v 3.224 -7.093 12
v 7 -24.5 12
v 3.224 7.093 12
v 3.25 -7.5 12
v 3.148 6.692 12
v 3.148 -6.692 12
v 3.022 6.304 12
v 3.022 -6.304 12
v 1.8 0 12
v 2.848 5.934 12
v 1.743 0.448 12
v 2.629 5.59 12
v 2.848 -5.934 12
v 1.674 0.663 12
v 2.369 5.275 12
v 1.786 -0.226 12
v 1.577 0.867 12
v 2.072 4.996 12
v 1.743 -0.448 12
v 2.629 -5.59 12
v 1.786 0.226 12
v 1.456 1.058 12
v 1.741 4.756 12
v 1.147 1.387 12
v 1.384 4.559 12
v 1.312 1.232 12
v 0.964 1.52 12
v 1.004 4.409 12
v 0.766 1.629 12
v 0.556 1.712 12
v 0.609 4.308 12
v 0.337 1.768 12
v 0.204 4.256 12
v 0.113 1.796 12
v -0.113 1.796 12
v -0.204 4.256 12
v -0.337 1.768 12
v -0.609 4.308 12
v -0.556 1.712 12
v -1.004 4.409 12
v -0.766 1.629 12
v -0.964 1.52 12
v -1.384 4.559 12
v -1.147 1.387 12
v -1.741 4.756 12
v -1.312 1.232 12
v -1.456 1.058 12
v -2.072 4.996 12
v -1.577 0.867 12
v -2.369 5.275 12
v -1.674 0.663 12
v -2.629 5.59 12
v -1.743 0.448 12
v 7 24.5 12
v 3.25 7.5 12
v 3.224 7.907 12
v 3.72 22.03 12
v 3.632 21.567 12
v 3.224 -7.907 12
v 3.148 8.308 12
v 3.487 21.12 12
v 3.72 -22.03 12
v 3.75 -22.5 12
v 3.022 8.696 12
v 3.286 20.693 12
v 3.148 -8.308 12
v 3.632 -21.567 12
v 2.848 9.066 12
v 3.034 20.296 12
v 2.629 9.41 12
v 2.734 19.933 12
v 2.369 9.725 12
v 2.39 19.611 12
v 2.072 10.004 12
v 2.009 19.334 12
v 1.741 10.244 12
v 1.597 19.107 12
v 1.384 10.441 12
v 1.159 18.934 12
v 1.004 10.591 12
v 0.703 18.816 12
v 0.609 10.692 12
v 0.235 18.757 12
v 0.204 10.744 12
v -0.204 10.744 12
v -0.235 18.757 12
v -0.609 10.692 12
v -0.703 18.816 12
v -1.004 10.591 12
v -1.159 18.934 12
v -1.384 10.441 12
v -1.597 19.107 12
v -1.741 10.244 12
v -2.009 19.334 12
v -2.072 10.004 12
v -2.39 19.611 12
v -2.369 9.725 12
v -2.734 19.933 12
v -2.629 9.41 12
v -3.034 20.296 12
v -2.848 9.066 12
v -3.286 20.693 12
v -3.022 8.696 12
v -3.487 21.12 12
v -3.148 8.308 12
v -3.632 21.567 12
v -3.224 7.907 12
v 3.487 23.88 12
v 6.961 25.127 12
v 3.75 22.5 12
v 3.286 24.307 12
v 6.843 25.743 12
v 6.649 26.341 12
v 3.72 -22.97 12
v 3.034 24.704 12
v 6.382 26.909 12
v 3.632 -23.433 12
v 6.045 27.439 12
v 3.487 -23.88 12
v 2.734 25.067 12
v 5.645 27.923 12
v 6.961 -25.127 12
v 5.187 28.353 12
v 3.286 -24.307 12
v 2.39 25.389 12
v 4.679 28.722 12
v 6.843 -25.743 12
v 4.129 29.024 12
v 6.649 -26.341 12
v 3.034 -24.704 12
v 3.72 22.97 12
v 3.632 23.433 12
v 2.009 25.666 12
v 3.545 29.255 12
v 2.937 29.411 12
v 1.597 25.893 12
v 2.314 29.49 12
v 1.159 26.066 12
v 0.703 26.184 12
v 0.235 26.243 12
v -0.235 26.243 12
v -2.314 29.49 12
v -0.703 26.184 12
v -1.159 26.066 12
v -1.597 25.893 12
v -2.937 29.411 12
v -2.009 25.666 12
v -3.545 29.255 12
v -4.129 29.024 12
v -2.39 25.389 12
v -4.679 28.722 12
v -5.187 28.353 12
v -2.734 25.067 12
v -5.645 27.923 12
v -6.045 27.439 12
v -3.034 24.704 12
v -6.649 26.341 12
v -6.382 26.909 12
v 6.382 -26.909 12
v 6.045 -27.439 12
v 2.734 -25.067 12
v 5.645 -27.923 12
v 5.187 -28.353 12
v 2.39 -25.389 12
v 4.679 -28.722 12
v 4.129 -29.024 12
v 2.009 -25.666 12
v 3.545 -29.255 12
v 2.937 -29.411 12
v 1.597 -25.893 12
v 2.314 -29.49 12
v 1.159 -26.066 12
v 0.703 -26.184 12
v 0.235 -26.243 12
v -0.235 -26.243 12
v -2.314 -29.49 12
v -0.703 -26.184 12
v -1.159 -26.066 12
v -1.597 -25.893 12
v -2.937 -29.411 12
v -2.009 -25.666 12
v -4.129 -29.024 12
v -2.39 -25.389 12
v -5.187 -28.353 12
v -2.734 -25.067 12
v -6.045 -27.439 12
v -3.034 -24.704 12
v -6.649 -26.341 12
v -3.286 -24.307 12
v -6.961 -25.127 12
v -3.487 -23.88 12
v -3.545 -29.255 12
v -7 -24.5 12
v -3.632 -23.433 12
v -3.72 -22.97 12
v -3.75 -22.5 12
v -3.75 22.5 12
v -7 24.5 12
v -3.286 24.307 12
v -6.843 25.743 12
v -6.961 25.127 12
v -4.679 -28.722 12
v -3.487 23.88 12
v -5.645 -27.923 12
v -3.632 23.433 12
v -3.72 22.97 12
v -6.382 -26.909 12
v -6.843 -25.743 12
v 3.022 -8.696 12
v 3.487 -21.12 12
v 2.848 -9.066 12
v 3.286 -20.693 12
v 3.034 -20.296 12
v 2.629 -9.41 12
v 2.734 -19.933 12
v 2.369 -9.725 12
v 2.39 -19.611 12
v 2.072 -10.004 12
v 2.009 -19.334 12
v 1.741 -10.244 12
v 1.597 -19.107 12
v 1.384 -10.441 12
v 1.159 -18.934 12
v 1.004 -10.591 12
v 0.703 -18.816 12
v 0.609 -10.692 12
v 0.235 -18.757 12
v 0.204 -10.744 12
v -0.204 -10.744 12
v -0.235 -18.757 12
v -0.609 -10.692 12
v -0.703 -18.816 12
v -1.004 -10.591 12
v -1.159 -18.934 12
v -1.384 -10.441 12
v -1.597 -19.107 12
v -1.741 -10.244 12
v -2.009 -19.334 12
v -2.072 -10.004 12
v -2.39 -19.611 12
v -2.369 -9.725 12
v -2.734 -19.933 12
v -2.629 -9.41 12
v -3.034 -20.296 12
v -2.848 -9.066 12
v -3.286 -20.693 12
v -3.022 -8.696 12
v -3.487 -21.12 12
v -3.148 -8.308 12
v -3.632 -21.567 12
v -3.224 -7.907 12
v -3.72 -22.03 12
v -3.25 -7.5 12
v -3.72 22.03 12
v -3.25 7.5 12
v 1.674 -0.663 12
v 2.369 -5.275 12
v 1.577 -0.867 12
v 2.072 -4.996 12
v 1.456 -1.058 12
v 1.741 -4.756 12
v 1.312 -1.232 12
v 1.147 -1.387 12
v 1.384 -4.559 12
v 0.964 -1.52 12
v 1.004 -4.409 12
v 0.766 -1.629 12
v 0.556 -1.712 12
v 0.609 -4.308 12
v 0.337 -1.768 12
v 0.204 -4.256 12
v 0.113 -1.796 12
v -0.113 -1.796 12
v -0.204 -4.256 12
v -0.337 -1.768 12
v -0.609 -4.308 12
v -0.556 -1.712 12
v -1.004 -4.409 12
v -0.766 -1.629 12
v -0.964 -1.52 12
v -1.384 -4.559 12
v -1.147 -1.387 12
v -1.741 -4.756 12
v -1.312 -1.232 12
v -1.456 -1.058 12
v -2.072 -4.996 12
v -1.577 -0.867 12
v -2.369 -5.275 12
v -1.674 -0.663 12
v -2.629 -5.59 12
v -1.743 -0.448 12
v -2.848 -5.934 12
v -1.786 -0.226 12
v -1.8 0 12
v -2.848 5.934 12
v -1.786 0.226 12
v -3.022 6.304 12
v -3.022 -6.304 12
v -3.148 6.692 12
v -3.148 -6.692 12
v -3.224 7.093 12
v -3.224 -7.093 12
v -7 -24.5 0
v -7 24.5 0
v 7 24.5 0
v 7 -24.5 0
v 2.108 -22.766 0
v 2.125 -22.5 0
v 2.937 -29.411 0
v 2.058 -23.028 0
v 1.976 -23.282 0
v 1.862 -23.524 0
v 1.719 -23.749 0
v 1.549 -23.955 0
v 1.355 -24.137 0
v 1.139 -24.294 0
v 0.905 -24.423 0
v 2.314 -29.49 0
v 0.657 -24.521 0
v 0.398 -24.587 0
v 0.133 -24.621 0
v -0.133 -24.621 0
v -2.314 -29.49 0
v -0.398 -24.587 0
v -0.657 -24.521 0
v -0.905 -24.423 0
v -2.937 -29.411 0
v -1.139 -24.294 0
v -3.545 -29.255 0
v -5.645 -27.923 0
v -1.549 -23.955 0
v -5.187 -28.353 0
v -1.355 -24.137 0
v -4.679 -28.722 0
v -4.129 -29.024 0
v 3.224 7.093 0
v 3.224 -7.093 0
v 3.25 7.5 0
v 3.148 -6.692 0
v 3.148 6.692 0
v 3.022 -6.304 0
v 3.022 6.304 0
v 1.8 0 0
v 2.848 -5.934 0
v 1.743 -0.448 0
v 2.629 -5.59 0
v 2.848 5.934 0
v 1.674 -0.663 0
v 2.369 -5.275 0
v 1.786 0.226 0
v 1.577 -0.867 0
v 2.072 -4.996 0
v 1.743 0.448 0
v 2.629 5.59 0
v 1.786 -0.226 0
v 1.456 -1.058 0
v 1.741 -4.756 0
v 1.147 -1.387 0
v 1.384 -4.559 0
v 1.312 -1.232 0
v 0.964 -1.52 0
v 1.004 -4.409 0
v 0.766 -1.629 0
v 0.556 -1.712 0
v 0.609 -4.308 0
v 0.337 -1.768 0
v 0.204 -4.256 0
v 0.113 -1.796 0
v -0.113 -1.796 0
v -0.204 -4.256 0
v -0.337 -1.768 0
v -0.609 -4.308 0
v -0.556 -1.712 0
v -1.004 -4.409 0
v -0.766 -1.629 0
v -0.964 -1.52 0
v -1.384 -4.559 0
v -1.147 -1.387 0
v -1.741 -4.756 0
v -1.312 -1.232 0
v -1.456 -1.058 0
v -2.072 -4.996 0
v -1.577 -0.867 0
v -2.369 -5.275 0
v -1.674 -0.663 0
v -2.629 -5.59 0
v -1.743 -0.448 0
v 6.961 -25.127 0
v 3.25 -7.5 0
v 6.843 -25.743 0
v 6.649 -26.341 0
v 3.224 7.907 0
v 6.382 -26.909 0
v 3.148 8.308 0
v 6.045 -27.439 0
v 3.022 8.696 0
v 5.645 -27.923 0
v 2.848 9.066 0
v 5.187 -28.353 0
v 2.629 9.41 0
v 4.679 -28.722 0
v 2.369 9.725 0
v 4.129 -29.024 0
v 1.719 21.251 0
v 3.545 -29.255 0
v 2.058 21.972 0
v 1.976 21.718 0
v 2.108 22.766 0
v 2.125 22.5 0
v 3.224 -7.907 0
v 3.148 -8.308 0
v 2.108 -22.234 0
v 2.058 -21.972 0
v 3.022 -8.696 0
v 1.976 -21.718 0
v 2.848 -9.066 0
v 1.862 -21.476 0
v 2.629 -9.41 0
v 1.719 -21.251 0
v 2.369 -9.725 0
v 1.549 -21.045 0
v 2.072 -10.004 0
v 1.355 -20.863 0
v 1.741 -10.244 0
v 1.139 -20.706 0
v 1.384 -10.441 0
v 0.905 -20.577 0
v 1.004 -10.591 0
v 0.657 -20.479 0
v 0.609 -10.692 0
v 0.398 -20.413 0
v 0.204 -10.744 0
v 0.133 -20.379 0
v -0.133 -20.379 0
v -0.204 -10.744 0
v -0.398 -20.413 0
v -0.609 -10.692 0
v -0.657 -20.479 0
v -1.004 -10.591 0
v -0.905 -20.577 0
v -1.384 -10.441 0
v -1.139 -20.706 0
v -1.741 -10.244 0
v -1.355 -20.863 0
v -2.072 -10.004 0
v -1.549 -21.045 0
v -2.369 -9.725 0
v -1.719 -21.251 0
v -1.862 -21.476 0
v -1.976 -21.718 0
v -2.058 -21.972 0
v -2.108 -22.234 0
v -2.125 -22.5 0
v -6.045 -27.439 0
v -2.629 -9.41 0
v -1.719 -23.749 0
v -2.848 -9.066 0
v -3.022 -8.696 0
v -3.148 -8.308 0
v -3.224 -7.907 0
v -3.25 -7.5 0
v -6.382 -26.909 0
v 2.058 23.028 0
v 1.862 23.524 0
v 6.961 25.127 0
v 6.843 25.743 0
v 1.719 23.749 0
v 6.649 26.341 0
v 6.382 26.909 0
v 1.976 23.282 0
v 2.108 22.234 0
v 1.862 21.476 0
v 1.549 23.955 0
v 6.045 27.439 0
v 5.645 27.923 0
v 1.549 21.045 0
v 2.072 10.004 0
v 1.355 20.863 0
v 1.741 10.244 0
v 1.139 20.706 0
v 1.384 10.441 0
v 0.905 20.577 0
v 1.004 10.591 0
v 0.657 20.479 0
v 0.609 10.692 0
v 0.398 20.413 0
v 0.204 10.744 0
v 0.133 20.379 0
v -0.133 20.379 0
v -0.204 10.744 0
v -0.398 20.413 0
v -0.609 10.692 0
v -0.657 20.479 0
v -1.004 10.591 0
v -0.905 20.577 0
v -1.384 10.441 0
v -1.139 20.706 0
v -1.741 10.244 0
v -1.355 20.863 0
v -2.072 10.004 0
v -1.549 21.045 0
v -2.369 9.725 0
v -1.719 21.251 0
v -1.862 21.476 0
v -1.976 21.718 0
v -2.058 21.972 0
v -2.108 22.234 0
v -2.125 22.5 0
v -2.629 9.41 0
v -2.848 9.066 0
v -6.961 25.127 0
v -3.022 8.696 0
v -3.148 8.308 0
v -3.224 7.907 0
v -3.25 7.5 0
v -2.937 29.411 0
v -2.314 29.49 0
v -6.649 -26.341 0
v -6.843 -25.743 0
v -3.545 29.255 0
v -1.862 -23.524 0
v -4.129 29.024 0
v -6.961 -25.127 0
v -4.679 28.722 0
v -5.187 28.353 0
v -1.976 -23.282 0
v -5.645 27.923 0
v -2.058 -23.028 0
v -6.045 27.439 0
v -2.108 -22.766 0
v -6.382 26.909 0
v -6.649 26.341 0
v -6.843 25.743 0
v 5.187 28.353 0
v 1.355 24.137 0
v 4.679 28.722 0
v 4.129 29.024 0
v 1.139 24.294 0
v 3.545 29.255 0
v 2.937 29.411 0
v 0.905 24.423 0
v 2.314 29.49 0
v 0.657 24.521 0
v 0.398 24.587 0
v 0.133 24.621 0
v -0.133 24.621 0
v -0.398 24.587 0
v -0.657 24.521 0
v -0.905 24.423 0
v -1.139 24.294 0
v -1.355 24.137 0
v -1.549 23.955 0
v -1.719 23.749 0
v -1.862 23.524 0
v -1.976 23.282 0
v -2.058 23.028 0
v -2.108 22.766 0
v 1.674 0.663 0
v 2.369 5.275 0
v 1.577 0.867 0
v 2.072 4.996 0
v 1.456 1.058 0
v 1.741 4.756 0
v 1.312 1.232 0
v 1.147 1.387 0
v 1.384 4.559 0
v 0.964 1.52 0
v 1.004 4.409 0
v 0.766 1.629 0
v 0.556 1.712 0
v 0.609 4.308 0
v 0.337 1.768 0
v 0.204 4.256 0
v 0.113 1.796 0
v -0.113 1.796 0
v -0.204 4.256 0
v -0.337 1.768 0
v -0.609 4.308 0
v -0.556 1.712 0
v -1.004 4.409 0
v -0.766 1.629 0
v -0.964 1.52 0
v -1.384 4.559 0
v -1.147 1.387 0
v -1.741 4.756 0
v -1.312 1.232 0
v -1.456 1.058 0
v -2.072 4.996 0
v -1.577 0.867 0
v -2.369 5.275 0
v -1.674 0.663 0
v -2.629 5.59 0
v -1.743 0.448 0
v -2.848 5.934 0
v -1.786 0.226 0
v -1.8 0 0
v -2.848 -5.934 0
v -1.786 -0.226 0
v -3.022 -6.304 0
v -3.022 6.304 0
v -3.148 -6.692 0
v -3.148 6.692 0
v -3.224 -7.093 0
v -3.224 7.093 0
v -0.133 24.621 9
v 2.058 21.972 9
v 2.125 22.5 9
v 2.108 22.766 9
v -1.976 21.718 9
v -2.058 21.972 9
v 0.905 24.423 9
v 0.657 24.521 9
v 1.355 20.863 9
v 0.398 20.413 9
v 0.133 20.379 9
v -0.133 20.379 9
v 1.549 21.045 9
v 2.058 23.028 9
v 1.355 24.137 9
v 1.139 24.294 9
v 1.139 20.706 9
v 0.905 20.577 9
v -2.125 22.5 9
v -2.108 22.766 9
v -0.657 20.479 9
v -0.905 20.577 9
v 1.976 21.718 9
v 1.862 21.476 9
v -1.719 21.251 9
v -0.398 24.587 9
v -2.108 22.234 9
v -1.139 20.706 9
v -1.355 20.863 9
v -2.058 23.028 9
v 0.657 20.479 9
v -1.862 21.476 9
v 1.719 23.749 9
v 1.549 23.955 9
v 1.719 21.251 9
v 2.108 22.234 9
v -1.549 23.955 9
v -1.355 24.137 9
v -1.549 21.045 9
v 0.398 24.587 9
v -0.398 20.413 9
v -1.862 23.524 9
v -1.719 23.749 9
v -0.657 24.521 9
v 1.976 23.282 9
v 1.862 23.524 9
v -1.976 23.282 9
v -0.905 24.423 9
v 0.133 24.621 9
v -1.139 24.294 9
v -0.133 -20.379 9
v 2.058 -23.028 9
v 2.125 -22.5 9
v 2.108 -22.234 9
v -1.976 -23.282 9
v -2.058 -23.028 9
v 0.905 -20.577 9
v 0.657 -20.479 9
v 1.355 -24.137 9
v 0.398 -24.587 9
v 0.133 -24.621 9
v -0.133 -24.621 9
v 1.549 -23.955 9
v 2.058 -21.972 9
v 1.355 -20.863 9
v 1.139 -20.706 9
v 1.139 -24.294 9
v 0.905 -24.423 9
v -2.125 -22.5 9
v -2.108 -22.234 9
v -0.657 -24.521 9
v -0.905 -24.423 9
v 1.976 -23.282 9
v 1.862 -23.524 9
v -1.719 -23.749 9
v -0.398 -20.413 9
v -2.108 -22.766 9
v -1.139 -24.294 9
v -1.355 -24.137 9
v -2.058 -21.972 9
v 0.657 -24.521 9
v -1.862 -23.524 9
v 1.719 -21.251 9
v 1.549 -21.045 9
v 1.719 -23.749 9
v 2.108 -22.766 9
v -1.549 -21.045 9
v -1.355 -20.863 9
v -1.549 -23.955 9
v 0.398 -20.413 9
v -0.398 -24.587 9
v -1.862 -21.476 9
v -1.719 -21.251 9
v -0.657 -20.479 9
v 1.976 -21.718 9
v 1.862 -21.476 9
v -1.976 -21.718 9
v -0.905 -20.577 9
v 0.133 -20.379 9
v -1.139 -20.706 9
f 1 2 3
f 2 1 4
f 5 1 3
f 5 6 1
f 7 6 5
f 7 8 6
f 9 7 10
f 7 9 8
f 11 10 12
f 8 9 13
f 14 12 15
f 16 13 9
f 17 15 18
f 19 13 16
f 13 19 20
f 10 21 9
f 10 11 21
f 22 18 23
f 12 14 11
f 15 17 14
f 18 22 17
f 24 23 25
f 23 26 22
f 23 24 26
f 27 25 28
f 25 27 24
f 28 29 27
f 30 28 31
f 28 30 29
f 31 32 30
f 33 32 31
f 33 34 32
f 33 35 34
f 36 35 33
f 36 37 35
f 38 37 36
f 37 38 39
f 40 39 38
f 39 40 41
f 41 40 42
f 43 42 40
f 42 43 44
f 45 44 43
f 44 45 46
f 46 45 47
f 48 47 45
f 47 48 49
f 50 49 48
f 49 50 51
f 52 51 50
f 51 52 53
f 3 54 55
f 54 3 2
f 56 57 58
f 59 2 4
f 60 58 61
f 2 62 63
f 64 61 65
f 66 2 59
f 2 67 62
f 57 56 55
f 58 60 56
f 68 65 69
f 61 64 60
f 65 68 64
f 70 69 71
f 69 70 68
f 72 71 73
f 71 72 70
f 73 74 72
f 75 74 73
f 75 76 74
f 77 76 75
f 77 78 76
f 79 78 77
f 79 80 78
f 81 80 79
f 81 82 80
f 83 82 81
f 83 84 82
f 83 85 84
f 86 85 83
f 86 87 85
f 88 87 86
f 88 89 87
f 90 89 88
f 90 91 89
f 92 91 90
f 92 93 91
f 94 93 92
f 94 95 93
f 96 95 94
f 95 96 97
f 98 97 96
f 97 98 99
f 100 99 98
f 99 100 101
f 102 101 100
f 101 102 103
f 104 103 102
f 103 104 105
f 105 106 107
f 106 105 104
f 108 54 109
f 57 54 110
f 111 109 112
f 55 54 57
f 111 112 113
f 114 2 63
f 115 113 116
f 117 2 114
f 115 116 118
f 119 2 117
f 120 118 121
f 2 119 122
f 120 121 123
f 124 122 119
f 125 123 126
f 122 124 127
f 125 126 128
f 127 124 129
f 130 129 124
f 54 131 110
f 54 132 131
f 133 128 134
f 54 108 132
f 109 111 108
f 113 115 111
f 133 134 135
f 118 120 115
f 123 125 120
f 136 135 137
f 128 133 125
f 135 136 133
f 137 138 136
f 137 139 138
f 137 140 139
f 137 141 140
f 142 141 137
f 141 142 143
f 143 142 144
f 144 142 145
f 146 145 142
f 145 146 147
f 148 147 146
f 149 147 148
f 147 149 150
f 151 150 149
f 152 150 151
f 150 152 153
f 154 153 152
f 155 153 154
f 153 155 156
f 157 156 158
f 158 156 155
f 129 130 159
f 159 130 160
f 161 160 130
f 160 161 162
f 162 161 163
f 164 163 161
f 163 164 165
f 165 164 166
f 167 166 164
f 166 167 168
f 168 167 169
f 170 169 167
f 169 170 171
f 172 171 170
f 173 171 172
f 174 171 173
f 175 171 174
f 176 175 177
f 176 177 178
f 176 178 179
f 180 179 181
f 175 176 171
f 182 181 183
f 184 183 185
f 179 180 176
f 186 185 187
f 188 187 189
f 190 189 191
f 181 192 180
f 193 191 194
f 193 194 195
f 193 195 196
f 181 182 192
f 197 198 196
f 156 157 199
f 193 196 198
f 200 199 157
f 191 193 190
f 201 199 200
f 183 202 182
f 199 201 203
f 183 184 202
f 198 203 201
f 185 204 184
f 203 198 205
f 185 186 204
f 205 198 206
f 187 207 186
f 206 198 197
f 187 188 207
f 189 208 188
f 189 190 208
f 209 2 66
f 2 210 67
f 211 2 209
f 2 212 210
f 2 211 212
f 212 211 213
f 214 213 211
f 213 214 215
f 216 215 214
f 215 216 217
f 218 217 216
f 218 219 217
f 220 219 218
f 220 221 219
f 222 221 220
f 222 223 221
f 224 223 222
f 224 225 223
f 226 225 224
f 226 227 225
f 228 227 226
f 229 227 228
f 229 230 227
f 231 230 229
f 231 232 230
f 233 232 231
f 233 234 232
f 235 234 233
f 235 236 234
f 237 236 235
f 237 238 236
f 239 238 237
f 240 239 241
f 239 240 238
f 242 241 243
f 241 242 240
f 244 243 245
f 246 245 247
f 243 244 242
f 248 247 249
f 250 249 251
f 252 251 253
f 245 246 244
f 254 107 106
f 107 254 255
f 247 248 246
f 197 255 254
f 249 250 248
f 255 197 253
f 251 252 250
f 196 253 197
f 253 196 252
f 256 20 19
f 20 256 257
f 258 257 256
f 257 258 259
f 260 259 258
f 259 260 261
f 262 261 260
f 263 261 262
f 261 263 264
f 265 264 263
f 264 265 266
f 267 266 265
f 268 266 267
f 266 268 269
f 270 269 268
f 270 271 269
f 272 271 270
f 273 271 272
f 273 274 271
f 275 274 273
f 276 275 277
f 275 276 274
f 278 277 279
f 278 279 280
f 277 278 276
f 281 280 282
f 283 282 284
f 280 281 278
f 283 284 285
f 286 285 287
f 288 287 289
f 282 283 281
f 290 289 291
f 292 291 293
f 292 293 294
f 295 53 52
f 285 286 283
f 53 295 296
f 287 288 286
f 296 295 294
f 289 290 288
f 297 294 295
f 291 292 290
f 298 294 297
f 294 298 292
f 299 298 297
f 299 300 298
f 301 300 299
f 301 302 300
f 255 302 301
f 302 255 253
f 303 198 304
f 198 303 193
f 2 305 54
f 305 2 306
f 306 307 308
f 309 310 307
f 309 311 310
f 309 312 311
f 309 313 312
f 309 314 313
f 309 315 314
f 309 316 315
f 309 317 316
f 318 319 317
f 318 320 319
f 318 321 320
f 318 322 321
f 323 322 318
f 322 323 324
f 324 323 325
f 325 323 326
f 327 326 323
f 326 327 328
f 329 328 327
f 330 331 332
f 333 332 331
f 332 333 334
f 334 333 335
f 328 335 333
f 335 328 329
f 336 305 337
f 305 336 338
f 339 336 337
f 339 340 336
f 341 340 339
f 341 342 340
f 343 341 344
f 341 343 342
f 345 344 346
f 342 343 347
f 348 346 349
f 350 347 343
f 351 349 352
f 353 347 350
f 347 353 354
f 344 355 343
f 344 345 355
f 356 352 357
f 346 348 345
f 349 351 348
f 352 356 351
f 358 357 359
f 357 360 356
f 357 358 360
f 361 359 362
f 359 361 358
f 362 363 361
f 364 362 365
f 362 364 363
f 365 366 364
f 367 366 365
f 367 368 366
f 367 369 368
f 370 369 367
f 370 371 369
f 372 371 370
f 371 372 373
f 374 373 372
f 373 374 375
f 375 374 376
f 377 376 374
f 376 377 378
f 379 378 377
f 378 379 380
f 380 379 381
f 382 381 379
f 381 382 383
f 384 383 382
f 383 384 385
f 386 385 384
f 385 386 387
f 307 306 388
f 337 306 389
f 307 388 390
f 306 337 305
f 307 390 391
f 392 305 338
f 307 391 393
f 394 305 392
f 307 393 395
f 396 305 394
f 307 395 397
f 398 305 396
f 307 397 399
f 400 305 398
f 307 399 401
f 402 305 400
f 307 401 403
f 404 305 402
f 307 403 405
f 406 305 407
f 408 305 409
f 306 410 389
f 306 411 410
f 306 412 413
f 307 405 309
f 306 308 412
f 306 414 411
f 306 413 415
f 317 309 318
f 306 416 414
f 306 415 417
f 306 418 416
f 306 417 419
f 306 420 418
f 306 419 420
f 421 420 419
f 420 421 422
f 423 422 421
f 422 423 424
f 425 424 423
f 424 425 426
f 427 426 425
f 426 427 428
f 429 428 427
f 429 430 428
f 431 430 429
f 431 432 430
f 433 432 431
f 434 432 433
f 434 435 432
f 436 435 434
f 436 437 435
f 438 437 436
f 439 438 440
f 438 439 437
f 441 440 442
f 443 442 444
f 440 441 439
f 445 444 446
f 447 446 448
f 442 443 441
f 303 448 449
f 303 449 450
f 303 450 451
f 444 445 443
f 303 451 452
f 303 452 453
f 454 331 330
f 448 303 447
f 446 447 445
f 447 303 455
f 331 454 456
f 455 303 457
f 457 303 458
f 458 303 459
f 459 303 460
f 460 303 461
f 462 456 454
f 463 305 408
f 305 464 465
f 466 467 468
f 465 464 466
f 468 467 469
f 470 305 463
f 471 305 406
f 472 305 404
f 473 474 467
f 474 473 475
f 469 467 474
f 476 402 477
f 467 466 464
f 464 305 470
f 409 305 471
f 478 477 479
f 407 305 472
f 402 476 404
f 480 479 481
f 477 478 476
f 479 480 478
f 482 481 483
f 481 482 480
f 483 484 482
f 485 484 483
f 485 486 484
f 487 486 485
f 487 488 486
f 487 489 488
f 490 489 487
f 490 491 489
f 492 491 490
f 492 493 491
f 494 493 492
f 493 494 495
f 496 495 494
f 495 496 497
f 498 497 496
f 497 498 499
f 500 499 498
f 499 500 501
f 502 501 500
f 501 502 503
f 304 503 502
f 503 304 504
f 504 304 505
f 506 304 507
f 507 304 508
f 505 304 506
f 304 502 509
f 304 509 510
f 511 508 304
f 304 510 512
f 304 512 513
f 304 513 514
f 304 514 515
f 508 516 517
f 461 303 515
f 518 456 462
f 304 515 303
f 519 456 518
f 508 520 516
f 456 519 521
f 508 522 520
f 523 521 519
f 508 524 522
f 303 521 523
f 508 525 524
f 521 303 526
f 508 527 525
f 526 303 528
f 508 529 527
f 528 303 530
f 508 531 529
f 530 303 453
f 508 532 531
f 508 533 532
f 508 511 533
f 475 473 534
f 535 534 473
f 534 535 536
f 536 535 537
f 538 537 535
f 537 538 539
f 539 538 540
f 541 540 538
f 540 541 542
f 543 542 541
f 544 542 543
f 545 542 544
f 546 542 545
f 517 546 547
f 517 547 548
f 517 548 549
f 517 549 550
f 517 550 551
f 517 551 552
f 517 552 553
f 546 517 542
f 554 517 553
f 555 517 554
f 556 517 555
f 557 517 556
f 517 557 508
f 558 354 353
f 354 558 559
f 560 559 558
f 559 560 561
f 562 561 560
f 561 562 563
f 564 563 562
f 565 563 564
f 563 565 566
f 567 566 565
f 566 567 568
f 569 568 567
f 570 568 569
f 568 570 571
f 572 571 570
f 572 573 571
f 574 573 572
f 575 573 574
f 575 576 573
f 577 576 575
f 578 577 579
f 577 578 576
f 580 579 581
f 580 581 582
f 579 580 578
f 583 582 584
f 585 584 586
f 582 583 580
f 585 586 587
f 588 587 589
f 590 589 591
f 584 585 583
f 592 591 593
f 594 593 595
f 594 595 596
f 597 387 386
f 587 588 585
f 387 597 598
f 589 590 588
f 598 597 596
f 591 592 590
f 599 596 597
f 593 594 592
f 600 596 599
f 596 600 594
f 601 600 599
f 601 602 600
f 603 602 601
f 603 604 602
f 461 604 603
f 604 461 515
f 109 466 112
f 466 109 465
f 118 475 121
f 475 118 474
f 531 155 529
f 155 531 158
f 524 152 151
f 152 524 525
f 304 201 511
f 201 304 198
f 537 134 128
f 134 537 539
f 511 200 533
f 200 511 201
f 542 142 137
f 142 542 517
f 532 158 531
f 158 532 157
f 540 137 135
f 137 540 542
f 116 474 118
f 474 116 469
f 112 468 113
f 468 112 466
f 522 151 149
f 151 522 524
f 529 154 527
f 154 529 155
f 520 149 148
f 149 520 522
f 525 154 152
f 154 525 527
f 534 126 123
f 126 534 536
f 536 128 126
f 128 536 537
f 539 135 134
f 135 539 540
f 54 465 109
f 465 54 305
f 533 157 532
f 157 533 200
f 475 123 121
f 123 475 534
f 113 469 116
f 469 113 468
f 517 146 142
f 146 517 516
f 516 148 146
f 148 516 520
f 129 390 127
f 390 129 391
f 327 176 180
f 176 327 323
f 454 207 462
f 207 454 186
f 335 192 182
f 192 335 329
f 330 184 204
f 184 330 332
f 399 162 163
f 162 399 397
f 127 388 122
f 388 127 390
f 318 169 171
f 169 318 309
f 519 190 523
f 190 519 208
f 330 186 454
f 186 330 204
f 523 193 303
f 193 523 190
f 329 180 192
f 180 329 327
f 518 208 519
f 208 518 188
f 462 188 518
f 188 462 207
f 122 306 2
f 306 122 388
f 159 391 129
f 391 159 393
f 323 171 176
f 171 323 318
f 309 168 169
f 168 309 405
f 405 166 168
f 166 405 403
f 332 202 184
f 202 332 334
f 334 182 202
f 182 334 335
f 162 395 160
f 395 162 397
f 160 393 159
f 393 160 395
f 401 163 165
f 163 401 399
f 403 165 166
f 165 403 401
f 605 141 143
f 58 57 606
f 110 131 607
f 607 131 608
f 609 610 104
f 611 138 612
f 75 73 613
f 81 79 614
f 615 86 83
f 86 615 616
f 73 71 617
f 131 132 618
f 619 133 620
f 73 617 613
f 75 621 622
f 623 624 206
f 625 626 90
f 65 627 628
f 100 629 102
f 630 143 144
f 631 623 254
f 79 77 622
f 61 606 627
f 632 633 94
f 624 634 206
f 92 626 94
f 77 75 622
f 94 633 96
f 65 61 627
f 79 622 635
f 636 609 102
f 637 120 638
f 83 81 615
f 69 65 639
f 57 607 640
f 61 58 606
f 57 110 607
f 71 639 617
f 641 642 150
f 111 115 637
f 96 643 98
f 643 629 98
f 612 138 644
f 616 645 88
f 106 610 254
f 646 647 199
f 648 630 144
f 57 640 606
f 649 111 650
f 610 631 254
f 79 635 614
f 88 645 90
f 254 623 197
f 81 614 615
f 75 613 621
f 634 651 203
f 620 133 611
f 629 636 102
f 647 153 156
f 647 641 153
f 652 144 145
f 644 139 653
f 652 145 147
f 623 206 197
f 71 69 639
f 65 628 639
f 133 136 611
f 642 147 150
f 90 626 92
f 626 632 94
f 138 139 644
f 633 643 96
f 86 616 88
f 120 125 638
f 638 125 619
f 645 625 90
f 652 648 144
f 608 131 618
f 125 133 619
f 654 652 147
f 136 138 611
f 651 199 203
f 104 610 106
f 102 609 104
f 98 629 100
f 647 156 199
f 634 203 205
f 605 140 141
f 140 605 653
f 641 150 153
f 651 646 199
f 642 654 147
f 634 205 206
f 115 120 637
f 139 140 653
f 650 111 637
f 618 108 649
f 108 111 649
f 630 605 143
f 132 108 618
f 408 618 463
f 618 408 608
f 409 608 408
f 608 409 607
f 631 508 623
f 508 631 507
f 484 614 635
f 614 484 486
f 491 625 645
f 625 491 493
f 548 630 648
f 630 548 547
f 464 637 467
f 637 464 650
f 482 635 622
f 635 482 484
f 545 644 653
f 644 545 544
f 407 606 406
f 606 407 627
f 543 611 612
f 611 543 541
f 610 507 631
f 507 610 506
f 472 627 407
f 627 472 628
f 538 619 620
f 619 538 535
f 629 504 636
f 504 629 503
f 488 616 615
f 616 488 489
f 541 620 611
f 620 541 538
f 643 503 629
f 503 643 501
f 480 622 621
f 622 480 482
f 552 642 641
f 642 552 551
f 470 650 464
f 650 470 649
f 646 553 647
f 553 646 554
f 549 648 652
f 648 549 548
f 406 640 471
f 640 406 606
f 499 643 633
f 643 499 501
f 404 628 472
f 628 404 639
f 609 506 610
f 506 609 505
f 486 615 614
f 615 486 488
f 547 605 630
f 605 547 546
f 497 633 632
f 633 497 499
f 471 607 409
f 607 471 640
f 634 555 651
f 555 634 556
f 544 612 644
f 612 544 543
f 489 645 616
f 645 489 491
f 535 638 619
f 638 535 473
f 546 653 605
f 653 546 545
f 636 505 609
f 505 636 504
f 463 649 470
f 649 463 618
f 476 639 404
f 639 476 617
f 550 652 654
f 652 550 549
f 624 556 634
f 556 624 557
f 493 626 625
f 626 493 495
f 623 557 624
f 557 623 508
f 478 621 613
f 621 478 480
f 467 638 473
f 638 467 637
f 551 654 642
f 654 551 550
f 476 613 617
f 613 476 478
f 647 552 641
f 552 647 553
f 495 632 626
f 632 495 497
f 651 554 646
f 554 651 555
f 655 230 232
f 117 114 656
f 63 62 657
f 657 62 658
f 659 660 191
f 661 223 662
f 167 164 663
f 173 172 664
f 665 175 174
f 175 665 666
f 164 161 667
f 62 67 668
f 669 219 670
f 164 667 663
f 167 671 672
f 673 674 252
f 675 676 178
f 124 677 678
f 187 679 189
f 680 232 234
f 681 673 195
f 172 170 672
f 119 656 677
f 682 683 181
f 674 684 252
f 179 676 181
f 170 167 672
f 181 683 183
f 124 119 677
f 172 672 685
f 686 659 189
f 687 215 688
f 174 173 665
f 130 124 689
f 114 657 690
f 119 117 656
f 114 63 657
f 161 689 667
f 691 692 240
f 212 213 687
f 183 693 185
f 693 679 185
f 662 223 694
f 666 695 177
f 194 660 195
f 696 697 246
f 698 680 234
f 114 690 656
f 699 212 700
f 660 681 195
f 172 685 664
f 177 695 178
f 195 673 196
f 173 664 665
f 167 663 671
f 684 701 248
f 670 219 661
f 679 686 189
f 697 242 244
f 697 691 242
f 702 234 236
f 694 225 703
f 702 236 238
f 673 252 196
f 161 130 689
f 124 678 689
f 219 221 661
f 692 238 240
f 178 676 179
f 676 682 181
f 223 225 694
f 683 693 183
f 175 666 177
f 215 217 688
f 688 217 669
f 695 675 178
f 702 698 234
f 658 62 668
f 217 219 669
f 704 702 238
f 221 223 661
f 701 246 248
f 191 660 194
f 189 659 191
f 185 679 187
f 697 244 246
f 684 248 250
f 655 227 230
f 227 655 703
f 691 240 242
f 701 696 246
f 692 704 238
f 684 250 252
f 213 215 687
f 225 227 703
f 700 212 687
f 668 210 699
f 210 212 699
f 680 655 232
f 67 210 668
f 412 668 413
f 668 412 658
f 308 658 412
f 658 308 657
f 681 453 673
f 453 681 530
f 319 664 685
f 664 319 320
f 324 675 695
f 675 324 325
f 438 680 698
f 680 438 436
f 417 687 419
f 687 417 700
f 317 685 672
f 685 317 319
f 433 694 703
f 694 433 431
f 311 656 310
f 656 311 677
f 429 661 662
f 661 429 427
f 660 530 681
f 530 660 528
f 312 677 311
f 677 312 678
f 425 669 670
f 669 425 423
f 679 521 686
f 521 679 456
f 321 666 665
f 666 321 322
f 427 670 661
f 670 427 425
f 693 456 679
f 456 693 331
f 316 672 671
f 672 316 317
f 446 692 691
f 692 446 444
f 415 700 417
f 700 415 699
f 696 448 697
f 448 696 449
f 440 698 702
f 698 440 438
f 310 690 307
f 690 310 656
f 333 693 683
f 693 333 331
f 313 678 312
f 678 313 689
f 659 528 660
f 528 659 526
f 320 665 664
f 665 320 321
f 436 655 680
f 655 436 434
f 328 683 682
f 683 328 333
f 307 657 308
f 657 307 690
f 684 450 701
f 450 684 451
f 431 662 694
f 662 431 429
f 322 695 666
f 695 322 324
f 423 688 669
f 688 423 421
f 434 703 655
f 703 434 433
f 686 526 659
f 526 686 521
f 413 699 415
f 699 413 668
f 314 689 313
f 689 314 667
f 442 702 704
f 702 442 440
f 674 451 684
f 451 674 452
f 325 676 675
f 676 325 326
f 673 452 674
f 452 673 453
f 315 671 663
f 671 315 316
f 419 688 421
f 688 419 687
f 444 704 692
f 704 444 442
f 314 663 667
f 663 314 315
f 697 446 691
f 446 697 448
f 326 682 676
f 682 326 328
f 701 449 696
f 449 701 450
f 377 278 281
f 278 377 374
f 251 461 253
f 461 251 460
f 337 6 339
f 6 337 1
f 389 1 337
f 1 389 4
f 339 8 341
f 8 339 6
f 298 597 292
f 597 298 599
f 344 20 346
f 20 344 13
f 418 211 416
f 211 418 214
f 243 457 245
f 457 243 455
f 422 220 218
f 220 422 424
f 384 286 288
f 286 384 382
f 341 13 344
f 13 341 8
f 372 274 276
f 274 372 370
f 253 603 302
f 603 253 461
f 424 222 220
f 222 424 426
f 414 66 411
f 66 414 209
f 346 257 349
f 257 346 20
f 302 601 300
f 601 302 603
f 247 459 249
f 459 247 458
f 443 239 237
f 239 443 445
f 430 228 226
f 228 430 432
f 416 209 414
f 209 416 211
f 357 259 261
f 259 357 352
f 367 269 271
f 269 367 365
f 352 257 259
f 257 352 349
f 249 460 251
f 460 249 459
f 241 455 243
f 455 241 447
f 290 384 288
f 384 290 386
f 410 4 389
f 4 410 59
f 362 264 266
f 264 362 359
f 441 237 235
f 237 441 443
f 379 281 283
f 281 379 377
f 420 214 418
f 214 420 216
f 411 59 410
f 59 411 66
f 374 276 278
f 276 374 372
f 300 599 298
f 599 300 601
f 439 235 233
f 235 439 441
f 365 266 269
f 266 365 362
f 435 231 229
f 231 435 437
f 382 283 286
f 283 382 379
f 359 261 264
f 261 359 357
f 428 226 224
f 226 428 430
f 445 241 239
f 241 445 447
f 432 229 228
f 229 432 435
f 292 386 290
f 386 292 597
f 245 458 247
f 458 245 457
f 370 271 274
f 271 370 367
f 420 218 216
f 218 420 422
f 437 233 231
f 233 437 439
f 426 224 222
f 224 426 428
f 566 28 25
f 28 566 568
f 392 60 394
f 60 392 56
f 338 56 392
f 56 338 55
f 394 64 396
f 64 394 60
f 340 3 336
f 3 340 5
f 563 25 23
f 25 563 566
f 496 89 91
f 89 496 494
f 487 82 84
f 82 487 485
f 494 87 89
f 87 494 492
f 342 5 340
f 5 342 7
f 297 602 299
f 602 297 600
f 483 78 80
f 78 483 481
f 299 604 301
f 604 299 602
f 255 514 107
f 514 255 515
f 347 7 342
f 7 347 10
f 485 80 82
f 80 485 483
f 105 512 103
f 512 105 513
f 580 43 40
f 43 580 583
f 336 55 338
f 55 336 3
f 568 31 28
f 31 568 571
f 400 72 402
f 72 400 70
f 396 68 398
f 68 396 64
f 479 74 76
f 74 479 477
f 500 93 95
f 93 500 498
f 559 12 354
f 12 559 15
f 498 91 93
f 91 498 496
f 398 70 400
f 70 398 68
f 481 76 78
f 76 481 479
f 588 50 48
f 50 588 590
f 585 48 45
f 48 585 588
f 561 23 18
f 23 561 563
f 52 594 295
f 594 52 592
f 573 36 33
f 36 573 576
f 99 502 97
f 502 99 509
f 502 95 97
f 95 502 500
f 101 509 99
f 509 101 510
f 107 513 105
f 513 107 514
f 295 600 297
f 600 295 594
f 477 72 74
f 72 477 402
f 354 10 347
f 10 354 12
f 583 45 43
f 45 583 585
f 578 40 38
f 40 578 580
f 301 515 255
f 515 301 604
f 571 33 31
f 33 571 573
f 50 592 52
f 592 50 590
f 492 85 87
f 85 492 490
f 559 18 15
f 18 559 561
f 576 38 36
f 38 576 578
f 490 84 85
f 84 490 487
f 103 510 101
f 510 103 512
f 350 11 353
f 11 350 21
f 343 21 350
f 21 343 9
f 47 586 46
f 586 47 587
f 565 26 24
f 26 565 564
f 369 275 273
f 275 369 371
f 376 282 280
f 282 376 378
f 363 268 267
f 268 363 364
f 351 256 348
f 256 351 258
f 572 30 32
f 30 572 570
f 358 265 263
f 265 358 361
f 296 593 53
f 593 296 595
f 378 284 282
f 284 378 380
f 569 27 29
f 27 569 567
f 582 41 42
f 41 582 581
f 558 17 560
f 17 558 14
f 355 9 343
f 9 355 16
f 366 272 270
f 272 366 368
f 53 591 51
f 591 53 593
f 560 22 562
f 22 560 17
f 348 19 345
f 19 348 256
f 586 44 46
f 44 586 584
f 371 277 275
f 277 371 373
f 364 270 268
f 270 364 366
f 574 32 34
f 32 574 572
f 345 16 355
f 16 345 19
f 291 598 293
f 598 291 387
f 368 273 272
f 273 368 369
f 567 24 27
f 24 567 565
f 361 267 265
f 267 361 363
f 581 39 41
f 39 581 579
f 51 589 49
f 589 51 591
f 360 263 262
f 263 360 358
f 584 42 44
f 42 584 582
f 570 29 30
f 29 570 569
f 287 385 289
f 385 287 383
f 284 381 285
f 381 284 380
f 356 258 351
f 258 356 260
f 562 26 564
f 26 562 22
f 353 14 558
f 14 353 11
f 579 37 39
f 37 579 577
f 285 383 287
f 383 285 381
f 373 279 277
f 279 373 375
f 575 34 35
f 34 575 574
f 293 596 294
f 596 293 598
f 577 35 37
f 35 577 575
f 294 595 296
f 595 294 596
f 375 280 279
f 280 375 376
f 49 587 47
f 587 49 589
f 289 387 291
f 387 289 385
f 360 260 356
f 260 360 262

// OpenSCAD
$fn = 50;


difference() {
	union() {
		hull() {
			translate(v = [-2.0000000000, 9.5000000000, 0]) {
				cylinder(h = 12, r = 5);
			}
			translate(v = [2.0000000000, 9.5000000000, 0]) {
				cylinder(h = 12, r = 5);
			}
			translate(v = [-2.0000000000, -9.5000000000, 0]) {
				cylinder(h = 12, r = 5);
			}
			translate(v = [2.0000000000, -9.5000000000, 0]) {
				cylinder(h = 12, r = 5);
			}
		}
		translate(v = [0.0000000000, 15.0000000000, 0]) {
			hull() {
				translate(v = [-2.0000000000, 9.5000000000, 0]) {
					cylinder(h = 12, r = 5);
				}
				translate(v = [2.0000000000, 9.5000000000, 0]) {
					cylinder(h = 12, r = 5);
				}
				translate(v = [-2.0000000000, -9.5000000000, 0]) {
					cylinder(h = 12, r = 5);
				}
				translate(v = [2.0000000000, -9.5000000000, 0]) {
					cylinder(h = 12, r = 5);
				}
			}
		}
		translate(v = [0.0000000000, 15.0000000000, 0]) {
			hull() {
				translate(v = [-2.0000000000, 9.5000000000, 0]) {
					cylinder(h = 12, r = 5);
				}
				translate(v = [2.0000000000, 9.5000000000, 0]) {
					cylinder(h = 12, r = 5);
				}
				translate(v = [-2.0000000000, -9.5000000000, 0]) {
					cylinder(h = 12, r = 5);
				}
				translate(v = [2.0000000000, -9.5000000000, 0]) {
					cylinder(h = 12, r = 5);
				}
			}
		}
		translate(v = [0.0000000000, -15.0000000000, 0]) {
			hull() {
				translate(v = [-2.0000000000, 9.5000000000, 0]) {
					cylinder(h = 12, r = 5);
				}
				translate(v = [2.0000000000, 9.5000000000, 0]) {
					cylinder(h = 12, r = 5);
				}
				translate(v = [-2.0000000000, -9.5000000000, 0]) {
					cylinder(h = 12, r = 5);
				}
				translate(v = [2.0000000000, -9.5000000000, 0]) {
					cylinder(h = 12, r = 5);
				}
			}
		}
		translate(v = [0.0000000000, -15.0000000000, 0]) {
			hull() {
				translate(v = [-2.0000000000, 9.5000000000, 0]) {
					cylinder(h = 12, r = 5);
				}
				translate(v = [2.0000000000, 9.5000000000, 0]) {
					cylinder(h = 12, r = 5);
				}
				translate(v = [-2.0000000000, -9.5000000000, 0]) {
					cylinder(h = 12, r = 5);
				}
				translate(v = [2.0000000000, -9.5000000000, 0]) {
					cylinder(h = 12, r = 5);
				}
			}
		}
	}
	union() {
		translate(v = [0.0000000000, 22.5000000000, 12]) {
			rotate(a = [0, 0, 0]) {
				difference() {
					union() {
						#translate(v = [0, 0, -12.0000000000]) {
							cylinder(h = 12, r = 2.0000000000);
						}
						#translate(v = [0, 0, -3]) {
							cylinder(h = 3, r1 = 2.1250000000, r2 = 3.7500000000);
						}
						#translate(v = [0, 0, -12.0000000000]) {
							cylinder(h = 12, r = 2.1250000000);
						}
						#translate(v = [0, 0, -12.0000000000]) {
							cylinder(h = 12, r = 2.0000000000);
						}
					}
					union();
				}
			}
		}
		translate(v = [0.0000000000, 22.5000000000, 12]) {
			rotate(a = [0, 0, 0]) {
				difference() {
					union() {
						#translate(v = [0, 0, -12.0000000000]) {
							cylinder(h = 12, r = 2.0000000000);
						}
						#translate(v = [0, 0, -3]) {
							cylinder(h = 3, r1 = 2.1250000000, r2 = 3.7500000000);
						}
						#translate(v = [0, 0, -12.0000000000]) {
							cylinder(h = 12, r = 2.1250000000);
						}
						#translate(v = [0, 0, -12.0000000000]) {
							cylinder(h = 12, r = 2.0000000000);
						}
					}
					union();
				}
			}
		}
		translate(v = [0.0000000000, -22.5000000000, 12]) {
			rotate(a = [0, 0, 0]) {
				difference() {
					union() {
						#translate(v = [0, 0, -12.0000000000]) {
							cylinder(h = 12, r = 2.0000000000);
						}
						#translate(v = [0, 0, -3]) {
							cylinder(h = 3, r1 = 2.1250000000, r2 = 3.7500000000);
						}
						#translate(v = [0, 0, -12.0000000000]) {
							cylinder(h = 12, r = 2.1250000000);
						}
						#translate(v = [0, 0, -12.0000000000]) {
							cylinder(h = 12, r = 2.0000000000);
						}
					}
					union();
				}
			}
		}
		translate(v = [0.0000000000, -22.5000000000, 12]) {
			rotate(a = [0, 0, 0]) {
				difference() {
					union() {
						#translate(v = [0, 0, -12.0000000000]) {
							cylinder(h = 12, r = 2.0000000000);
						}
						#translate(v = [0, 0, -3]) {
							cylinder(h = 3, r1 = 2.1250000000, r2 = 3.7500000000);
						}
						#translate(v = [0, 0, -12.0000000000]) {
							cylinder(h = 12, r = 2.1250000000);
						}
						#translate(v = [0, 0, -12.0000000000]) {
							cylinder(h = 12, r = 2.0000000000);
						}
					}
					union();
				}
			}
		}
		translate(v = [0.0000000000, -7.5000000000, 0]) {
			translate(v = [0, 0, -100]) {
				cylinder(h = 200, r = 3.2500000000);
			}
		}
		translate(v = [0.0000000000, 7.5000000000, 0]) {
			translate(v = [0, 0, -100]) {
				cylinder(h = 200, r = 3.2500000000);
			}
		}
		translate(v = [0.0000000000, -7.5000000000, 0]) {
			translate(v = [0, 0, -100]) {
				cylinder(h = 200, r = 1.8000000000);
			}
		}
		translate(v = [0, 0, -100]) {
			cylinder(h = 200, r = 1.8000000000);
		}
		translate(v = [0.0000000000, 7.5000000000, 0]) {
			translate(v = [0, 0, -100]) {
				cylinder(h = 200, r = 1.8000000000);
			}
		}
	}
}
